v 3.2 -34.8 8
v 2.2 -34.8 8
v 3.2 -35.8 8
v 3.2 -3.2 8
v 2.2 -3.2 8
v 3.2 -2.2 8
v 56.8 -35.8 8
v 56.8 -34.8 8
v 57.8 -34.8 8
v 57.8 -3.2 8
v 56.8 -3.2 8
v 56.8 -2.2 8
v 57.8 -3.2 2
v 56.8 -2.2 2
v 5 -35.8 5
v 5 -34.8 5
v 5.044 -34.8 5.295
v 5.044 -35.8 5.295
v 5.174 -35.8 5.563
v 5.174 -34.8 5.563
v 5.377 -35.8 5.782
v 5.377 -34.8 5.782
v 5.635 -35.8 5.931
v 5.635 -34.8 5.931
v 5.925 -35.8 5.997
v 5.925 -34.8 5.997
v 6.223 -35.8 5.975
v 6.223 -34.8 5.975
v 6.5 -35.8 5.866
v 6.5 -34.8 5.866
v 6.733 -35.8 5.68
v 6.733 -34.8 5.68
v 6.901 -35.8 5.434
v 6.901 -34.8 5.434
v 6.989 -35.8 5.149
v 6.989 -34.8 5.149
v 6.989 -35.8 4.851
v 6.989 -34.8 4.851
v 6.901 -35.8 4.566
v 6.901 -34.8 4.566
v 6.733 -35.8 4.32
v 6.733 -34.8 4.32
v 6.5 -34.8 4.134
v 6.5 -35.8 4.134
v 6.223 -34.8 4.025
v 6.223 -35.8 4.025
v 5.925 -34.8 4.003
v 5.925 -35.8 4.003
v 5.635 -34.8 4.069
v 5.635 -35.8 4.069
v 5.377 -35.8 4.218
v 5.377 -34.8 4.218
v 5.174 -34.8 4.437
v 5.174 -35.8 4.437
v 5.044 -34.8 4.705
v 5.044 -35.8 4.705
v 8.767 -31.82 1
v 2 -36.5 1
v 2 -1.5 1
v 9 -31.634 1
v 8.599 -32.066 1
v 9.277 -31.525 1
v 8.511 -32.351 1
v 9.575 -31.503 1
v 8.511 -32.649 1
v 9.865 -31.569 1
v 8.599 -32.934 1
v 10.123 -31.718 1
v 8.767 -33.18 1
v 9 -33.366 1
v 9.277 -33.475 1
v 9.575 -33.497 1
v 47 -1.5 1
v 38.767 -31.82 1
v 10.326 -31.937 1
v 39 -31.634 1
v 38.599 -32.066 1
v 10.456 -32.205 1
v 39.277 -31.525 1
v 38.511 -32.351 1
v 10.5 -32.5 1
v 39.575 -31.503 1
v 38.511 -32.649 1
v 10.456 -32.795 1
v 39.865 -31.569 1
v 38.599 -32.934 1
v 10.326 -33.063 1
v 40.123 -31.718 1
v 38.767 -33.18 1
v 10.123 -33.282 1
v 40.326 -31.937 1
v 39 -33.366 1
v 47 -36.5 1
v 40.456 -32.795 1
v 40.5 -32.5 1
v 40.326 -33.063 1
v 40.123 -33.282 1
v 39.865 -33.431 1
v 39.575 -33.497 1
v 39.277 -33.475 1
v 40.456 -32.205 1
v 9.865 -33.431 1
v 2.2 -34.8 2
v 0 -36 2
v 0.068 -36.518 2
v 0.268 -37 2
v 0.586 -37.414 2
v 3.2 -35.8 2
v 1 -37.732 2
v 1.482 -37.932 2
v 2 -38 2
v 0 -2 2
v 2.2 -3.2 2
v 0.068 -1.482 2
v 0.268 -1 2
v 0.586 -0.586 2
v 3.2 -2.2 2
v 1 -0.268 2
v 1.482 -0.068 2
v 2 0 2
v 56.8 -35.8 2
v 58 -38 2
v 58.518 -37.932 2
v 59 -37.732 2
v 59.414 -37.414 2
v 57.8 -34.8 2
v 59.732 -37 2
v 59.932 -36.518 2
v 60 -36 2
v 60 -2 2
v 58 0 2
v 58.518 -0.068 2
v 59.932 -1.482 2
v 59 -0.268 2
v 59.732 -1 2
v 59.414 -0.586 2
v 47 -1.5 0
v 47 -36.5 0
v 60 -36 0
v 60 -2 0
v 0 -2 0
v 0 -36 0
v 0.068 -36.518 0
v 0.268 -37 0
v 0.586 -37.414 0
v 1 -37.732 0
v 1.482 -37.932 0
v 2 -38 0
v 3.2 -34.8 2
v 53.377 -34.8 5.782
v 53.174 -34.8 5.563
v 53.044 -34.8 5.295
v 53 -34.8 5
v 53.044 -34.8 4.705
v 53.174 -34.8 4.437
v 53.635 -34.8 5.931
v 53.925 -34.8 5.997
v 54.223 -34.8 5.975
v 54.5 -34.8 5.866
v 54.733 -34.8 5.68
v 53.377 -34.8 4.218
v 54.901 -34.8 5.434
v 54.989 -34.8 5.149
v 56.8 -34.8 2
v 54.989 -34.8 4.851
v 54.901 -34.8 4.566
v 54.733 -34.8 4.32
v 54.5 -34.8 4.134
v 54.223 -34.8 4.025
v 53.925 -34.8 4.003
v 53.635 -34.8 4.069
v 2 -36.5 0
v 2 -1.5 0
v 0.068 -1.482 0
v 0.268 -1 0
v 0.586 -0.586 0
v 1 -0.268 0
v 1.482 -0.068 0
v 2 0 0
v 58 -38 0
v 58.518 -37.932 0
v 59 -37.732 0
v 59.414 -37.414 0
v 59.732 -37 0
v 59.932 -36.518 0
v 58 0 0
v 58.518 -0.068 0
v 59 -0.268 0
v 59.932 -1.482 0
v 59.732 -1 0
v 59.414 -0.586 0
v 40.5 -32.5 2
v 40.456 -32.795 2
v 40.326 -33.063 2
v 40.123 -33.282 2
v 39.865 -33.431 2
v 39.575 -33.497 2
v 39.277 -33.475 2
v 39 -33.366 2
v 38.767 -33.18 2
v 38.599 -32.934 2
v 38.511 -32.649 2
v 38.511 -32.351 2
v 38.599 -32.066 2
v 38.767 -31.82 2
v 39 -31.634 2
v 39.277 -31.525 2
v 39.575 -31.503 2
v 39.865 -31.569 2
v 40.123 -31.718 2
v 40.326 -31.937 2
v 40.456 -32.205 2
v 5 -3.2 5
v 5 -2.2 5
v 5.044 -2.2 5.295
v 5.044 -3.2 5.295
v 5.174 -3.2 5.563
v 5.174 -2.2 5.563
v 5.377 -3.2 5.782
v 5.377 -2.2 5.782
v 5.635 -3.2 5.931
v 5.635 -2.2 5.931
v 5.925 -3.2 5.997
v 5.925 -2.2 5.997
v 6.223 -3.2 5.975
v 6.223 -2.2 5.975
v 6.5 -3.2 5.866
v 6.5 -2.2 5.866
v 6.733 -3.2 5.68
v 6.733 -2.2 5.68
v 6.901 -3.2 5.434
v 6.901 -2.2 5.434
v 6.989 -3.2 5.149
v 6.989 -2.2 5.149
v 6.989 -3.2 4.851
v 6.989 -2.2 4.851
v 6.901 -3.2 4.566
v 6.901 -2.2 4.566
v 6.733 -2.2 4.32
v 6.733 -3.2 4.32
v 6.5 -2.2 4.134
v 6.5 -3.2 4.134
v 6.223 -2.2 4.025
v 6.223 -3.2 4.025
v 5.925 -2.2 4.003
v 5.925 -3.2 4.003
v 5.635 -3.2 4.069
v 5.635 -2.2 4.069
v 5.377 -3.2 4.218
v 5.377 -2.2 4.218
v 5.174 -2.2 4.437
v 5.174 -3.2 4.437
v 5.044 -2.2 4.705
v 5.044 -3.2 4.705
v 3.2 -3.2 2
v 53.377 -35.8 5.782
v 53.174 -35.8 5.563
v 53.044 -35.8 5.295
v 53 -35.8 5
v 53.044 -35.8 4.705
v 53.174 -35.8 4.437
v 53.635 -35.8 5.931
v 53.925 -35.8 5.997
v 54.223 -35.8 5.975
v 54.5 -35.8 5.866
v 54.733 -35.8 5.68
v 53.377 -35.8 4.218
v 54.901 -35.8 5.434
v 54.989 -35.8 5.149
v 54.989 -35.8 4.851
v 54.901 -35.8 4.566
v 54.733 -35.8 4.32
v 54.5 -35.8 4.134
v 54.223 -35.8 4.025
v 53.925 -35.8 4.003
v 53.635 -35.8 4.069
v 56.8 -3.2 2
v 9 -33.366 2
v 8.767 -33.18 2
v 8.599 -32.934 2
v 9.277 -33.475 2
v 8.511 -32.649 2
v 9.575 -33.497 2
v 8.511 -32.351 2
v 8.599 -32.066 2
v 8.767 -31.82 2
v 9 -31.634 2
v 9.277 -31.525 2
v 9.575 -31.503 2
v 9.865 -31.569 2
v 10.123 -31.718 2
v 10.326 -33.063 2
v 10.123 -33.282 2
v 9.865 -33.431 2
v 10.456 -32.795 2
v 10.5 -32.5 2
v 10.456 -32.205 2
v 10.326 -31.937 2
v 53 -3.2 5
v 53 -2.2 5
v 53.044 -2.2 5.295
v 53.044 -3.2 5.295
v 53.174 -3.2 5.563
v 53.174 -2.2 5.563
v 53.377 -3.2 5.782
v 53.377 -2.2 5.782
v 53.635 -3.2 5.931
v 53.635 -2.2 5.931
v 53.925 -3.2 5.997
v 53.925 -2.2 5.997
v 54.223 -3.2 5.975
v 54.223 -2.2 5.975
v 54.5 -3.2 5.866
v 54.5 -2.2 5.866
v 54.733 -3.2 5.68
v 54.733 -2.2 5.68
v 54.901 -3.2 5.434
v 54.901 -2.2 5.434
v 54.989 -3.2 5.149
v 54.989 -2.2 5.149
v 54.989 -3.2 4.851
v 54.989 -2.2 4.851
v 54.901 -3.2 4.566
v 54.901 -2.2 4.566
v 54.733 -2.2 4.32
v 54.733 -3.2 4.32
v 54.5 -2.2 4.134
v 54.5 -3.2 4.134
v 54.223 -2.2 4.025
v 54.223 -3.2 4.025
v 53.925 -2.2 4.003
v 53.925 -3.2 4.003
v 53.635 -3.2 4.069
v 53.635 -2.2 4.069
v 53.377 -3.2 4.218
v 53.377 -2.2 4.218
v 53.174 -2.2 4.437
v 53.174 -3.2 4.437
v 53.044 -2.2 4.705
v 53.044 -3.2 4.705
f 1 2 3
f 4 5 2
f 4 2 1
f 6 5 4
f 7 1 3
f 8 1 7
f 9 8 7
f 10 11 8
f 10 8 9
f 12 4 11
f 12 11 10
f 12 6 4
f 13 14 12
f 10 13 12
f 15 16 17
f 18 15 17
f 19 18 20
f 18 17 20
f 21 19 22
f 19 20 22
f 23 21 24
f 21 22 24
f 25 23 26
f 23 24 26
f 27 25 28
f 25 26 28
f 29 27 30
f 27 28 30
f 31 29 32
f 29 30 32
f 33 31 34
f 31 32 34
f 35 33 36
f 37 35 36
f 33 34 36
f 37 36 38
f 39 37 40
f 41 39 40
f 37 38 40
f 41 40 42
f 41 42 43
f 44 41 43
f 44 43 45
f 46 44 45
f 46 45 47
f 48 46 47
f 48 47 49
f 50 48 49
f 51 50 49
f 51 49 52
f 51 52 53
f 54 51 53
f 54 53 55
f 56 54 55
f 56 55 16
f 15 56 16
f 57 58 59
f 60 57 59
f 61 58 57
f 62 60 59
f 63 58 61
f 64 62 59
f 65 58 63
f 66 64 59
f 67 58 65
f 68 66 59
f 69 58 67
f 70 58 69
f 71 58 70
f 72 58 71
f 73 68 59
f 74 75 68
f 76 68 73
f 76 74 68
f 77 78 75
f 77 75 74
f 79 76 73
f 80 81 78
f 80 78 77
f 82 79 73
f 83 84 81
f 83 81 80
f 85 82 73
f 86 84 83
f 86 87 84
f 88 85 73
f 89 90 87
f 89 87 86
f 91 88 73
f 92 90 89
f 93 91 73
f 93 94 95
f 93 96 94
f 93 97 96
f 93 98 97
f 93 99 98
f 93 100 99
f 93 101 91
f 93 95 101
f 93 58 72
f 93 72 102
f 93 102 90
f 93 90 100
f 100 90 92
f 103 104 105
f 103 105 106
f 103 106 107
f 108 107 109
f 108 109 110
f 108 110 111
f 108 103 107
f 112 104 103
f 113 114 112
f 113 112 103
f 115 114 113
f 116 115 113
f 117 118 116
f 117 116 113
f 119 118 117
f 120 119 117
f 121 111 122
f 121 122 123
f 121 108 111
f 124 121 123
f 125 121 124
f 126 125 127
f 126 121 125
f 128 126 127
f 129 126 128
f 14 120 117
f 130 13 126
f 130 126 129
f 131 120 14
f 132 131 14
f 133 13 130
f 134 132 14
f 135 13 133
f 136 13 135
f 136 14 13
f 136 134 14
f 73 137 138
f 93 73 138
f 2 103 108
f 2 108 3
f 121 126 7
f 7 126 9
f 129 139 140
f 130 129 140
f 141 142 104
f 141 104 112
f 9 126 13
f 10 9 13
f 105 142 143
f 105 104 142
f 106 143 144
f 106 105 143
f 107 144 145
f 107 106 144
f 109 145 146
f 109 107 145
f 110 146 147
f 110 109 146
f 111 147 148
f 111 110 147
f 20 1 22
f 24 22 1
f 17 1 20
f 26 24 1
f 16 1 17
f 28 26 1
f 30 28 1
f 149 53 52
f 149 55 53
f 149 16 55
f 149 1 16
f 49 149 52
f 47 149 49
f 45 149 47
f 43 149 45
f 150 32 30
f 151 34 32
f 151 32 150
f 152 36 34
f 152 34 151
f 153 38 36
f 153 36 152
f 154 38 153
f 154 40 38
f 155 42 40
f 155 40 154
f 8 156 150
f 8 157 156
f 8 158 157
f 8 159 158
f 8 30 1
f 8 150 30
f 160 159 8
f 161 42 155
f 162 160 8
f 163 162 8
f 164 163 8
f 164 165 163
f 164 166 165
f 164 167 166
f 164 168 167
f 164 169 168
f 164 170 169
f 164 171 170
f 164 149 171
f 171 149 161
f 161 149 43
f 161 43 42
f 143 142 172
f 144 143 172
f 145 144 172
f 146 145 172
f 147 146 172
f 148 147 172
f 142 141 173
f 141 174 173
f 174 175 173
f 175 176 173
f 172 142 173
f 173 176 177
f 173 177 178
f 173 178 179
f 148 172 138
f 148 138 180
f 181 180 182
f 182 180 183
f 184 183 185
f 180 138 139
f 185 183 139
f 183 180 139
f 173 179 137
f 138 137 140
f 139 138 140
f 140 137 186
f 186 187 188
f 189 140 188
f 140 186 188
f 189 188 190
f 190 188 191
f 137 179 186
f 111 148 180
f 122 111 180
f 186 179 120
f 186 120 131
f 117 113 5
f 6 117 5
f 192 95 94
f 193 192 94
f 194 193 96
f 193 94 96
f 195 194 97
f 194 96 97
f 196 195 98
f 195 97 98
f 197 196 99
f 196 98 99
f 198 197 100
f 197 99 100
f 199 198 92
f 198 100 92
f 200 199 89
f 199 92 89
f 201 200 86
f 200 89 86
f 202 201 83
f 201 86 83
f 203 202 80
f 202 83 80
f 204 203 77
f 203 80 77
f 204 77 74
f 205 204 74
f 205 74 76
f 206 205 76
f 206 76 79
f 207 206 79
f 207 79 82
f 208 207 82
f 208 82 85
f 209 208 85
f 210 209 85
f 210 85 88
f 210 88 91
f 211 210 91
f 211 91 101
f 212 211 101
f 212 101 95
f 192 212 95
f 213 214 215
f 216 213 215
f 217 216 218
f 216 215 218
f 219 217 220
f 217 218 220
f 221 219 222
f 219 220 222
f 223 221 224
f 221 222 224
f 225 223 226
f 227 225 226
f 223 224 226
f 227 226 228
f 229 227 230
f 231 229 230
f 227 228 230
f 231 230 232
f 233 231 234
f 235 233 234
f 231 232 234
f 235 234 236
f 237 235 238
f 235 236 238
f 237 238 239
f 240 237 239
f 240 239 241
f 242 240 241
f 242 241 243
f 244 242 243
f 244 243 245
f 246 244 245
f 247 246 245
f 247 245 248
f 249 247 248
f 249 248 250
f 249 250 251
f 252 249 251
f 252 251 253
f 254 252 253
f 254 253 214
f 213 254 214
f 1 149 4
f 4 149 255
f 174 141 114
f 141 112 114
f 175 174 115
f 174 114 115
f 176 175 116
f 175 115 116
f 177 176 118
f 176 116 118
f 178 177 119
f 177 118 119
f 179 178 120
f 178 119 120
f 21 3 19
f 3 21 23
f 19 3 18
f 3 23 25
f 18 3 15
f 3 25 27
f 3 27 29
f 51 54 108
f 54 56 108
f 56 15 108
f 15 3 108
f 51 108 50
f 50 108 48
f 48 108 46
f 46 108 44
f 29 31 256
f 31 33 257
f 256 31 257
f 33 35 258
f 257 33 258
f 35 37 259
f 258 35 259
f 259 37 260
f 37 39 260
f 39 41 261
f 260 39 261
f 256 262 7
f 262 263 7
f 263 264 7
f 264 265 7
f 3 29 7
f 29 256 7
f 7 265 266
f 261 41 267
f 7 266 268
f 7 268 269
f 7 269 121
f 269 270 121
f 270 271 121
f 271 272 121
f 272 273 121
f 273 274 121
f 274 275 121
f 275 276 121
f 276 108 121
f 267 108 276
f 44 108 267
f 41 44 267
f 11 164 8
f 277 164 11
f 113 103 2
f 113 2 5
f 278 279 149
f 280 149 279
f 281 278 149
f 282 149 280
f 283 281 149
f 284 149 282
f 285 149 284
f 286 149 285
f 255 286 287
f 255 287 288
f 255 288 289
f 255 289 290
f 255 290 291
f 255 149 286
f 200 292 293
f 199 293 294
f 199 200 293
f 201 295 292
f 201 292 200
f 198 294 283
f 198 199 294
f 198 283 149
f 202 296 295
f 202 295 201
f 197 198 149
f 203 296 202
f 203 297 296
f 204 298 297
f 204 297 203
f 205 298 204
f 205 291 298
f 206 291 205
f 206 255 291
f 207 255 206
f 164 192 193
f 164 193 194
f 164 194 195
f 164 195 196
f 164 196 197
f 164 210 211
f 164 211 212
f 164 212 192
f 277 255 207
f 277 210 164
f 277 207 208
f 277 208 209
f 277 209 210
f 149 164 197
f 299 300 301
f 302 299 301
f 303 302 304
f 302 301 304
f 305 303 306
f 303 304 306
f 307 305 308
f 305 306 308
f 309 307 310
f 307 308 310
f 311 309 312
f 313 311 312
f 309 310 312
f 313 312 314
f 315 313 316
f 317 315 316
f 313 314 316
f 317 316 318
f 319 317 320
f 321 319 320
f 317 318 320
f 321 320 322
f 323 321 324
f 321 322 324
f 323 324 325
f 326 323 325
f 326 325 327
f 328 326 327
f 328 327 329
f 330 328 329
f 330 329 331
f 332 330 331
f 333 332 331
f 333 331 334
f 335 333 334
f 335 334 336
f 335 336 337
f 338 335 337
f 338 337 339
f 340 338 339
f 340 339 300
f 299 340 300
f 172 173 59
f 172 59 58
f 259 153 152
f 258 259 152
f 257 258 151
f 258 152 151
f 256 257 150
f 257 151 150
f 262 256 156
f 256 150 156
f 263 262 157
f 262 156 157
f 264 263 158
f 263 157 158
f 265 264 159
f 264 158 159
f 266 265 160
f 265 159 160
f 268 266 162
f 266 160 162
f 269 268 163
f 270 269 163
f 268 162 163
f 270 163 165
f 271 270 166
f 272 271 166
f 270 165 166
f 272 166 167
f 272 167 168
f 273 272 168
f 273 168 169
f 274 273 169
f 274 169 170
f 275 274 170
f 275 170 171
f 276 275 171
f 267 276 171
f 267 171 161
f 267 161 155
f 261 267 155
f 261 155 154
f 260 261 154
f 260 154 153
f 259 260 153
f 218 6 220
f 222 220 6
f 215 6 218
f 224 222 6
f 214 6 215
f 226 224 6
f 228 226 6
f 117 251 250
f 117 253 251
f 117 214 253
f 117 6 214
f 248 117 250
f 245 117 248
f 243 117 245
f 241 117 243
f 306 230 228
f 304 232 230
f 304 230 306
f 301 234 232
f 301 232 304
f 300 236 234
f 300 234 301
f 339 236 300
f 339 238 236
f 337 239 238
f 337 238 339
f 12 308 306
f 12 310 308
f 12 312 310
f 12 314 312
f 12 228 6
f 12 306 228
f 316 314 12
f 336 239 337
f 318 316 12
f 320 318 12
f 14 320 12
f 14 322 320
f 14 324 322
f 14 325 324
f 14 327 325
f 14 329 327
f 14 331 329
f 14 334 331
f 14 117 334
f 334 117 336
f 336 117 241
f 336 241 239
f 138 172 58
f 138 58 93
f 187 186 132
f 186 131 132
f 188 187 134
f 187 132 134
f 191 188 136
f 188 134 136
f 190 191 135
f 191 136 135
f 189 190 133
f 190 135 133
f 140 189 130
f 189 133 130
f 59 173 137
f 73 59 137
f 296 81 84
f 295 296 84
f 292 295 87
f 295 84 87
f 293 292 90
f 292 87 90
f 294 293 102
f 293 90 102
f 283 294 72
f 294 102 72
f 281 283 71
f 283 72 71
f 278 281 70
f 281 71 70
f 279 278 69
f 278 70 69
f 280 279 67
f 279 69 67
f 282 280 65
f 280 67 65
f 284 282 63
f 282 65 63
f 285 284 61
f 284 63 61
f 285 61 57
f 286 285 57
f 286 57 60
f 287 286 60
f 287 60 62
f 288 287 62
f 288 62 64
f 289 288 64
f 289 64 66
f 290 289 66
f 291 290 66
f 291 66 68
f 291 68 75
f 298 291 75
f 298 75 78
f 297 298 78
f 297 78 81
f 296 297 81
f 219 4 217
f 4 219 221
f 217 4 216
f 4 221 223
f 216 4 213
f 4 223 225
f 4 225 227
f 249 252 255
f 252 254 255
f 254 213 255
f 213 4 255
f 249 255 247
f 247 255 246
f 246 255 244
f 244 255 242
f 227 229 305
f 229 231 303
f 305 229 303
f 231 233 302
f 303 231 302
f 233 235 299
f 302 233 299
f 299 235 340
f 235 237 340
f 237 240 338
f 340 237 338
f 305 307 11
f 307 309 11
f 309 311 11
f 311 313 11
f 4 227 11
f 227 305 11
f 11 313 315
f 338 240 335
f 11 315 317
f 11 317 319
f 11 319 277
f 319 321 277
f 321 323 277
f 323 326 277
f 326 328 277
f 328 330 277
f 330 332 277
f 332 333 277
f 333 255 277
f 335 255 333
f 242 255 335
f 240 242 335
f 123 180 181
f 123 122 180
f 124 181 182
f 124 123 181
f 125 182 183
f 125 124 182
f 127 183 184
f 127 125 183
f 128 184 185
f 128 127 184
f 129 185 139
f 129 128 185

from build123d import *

# Parameters (mm, degrees)
F0_W      = 60
F0_H      = 38
F1_DEPTH  = 2
F2_W      = 55.6
F2_H      = 33.6
F2_W_2    = 53.6
F2_H_2    = 31.6
F3_DEPTH  = 6
F4_W      = 45
F4_H      = 35
F5_DEPTH  = 1
F6_R      = 2
F7_R      = 1
F8_DEPTH  = 8.001
F9_R      = 1
F10_DEPTH = 35.801
F11_SIZE  = 1


with BuildPart() as f1:
    # F0 (on Top) → F1 (new body)
    with BuildSketch(Plane.XY):
        with Locations((30, -19)):
            Rectangle(F0_W, F0_H)
    extrude(amount=F1_DEPTH)

    # F2 (on face) → F3 (join)
    with BuildSketch(Plane.XY.offset(2)):
        with Locations((30, -19)):
            Rectangle(F2_W, F2_H)
        with Locations((30, -19)):
            Rectangle(F2_W_2, F2_H_2, mode=Mode.SUBTRACT)
    extrude(amount=F3_DEPTH)

    # F4 (on face) → F5 (cut)
    with BuildSketch(Plane(origin=(0, 0, 0), x_dir=(1, 0, 0), z_dir=(0, 0, -1))):
        with Locations((24.5, 19)):
            Rectangle(F4_W, F4_H)
    extrude(amount=-F5_DEPTH, mode=Mode.SUBTRACT)

    # F6
    f6_edges = [f1.edges().sort_by_distance(p)[0] for p in [
        (0, -38, 1),
        (0, 0, 1),
        (60, -38, 1),
        (60, 0, 1),
    ]]
    fillet(f6_edges, radius=F6_R)

    # F7 (on face) → F8 (cut, through all)
    with BuildSketch(Plane(origin=(0, 0, 0), x_dir=(1, 0, 0), z_dir=(0, 0, -1))):
        with Locations((9.5, 32.5)):
            Circle(F7_R)
        with Locations((39.5, 32.5)):
            Circle(F7_R)
    extrude(amount=-F8_DEPTH, mode=Mode.SUBTRACT)

    # F9 (on face) → F10 (cut, through all)
    with BuildSketch(Plane(origin=(0, -2.2, 0), x_dir=(-1, 0, 0), z_dir=(0, 1, 0))):
        with Locations((-54, 5)):
            Circle(F9_R)
        with Locations((-6, 5)):
            Circle(F9_R)
    extrude(amount=-F10_DEPTH, mode=Mode.SUBTRACT)

    # F11
    f11_edges = [f1.edges().sort_by_distance(p)[0] for p in [
        (2.2, -2.2, 5),
        (2.2, -35.8, 5),
        (57.8, -35.8, 5),
        (57.8, -2.2, 5),
    ]]
    chamfer(f11_edges, length=F11_SIZE)


solid = f1.part
